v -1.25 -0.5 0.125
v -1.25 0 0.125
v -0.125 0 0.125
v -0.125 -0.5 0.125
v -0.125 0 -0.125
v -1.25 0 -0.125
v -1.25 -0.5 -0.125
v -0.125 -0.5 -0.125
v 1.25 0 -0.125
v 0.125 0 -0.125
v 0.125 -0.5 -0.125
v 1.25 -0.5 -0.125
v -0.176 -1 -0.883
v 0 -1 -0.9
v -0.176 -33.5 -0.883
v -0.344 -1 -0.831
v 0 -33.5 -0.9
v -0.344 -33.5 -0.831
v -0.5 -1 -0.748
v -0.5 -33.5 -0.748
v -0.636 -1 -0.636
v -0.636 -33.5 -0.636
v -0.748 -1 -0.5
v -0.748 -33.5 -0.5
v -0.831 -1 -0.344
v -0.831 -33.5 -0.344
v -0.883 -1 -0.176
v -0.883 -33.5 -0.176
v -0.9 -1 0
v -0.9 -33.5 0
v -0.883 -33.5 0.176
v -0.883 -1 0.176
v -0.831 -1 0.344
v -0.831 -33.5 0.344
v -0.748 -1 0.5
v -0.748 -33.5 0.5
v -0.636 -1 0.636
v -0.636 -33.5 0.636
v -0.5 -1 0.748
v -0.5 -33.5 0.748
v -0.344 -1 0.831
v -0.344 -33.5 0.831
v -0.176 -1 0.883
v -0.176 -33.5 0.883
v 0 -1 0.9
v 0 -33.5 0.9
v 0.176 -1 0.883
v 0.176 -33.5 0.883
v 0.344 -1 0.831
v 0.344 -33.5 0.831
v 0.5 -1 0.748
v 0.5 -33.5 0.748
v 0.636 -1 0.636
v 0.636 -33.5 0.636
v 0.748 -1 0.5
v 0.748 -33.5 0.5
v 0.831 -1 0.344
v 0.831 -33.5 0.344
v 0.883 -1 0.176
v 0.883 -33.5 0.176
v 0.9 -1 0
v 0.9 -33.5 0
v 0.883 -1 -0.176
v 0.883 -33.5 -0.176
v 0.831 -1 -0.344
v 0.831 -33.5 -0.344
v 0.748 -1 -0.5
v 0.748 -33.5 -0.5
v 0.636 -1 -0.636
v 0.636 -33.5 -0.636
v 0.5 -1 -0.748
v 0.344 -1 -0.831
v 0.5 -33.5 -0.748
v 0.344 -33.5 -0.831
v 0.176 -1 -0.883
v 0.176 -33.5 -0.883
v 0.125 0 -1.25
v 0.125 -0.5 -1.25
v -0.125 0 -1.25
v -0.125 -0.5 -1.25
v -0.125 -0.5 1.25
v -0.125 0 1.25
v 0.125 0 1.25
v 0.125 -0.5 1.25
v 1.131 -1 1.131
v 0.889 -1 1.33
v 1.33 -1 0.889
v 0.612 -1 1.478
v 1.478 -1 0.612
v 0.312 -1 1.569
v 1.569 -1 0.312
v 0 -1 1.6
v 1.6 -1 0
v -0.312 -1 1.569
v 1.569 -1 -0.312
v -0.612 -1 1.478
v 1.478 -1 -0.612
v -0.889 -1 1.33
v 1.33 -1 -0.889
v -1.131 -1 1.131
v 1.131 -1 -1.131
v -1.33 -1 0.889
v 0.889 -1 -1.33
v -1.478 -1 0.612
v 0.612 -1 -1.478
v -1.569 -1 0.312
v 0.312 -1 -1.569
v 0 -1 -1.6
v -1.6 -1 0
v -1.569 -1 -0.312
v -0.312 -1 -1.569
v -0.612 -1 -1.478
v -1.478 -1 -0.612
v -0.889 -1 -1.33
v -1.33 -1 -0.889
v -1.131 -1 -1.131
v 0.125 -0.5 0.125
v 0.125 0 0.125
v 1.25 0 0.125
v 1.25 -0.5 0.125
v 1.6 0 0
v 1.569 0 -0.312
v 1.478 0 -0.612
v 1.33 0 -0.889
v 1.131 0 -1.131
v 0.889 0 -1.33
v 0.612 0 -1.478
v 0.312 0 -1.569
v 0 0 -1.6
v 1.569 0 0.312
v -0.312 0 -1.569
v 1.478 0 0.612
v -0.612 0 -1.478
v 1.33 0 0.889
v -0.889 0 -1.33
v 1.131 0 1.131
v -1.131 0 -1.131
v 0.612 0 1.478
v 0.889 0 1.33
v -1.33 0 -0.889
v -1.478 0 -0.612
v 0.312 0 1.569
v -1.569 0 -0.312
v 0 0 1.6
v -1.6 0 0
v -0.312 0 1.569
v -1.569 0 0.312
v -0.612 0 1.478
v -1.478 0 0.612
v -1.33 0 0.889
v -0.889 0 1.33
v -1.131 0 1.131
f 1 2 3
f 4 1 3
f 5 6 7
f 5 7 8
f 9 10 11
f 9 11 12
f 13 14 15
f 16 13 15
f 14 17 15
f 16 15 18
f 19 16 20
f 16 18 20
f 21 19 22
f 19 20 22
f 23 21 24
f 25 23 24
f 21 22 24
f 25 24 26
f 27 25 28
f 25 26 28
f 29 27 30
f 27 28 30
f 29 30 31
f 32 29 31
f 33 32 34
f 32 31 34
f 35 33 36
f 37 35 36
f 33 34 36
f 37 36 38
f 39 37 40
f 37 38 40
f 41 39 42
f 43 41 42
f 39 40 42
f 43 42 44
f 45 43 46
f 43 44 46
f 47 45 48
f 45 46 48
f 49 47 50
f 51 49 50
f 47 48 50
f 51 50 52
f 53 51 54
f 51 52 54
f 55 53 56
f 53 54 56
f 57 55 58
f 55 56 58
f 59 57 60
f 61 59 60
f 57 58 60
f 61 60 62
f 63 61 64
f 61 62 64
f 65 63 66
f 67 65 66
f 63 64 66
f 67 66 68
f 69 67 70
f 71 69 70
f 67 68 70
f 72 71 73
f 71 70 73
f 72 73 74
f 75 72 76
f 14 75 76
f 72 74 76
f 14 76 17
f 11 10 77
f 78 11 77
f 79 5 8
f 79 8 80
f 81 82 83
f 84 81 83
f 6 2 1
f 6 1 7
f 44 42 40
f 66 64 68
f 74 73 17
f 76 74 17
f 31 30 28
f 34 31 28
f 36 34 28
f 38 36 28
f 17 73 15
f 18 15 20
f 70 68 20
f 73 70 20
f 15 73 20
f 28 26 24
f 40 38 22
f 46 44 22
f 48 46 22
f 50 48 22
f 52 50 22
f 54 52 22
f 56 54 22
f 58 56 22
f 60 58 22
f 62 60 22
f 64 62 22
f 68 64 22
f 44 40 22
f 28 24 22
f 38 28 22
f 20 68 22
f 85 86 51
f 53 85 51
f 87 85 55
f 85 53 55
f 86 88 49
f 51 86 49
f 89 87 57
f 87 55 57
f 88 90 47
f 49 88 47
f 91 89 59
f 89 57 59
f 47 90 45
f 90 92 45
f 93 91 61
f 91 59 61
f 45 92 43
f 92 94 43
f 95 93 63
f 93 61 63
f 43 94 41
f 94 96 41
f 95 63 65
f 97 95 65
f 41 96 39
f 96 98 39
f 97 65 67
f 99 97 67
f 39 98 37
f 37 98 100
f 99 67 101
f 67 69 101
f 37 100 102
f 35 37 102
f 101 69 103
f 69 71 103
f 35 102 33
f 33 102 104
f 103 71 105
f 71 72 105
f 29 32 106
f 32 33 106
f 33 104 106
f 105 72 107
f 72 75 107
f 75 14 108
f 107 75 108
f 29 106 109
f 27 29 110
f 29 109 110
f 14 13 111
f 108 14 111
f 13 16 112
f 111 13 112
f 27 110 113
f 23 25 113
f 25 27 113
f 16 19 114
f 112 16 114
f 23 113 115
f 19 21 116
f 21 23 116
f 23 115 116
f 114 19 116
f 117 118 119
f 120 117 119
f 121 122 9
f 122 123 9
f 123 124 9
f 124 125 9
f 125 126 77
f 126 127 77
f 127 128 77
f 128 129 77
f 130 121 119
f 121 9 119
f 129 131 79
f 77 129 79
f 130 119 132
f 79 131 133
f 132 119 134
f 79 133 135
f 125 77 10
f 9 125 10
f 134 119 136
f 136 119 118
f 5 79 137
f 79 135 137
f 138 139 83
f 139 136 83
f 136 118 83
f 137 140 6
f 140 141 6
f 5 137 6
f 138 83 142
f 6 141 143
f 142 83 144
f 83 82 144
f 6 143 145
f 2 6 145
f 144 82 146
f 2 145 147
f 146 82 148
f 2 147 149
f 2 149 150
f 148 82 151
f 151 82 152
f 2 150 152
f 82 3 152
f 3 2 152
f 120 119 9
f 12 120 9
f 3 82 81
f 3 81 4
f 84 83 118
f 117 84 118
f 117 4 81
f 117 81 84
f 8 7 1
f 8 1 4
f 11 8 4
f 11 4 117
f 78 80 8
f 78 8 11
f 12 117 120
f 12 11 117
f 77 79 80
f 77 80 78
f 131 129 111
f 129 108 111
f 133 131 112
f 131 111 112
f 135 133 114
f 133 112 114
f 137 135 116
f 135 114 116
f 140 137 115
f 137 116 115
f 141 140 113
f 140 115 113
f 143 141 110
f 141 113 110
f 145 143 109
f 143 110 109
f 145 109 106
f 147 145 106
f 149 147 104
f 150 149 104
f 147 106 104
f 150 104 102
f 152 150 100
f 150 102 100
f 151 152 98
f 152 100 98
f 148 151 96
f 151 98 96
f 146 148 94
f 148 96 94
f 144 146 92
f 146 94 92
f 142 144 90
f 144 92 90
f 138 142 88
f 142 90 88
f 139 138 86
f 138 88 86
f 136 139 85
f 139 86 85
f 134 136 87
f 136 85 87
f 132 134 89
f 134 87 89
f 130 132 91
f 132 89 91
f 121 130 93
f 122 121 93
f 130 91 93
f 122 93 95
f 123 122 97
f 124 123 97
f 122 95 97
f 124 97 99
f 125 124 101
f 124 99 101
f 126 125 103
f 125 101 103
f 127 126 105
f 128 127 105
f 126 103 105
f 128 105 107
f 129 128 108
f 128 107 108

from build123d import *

# Parameters (mm, degrees)
SKETCH2_W          = 0.25
SKETCH2_H          = 1.125
SKETCH2_W_2        = 1.125
SKETCH2_H_2        = 0.25
CUT_EXTRUDE1_DEPTH = 0.5


with BuildPart() as part:
    # Sketch1 → Revolve1 (revolve)
    with BuildSketch(Plane.XY, mode=Mode.PRIVATE) as revolve1_sk:
        Polygon((0, 0), (1.6, 0), (1.6, -1), (0.9, -1), (0.9, -33.5), (0, -33.5), align=None)
    revolve(revolve1_sk.sketch.rotate(Axis((0, -33.5, 0), (0, 1, 0)), 90), axis=Axis((0, -33.5, 0), (0, 1, 0)))

    # Sketch2 → Cut-Extrude1 (cut)
    with BuildSketch(Plane(origin=(0, 0, 0), x_dir=(1, 0, 0), z_dir=(0, 1, 0))):
        with Locations((0, -0.6875)):
            Rectangle(SKETCH2_W, SKETCH2_H)
        with Locations((-0.6875, 0)):
            Rectangle(SKETCH2_W_2, SKETCH2_H_2)
        with Locations((0, 0.6875)):
            Rectangle(SKETCH2_W, SKETCH2_H)
        with Locations((0.6875, 0)):
            Rectangle(SKETCH2_W_2, SKETCH2_H_2)
        Rectangle(SKETCH2_W, SKETCH2_H_2)
    extrude(amount=-CUT_EXTRUDE1_DEPTH, mode=Mode.SUBTRACT)


solid = part.part
